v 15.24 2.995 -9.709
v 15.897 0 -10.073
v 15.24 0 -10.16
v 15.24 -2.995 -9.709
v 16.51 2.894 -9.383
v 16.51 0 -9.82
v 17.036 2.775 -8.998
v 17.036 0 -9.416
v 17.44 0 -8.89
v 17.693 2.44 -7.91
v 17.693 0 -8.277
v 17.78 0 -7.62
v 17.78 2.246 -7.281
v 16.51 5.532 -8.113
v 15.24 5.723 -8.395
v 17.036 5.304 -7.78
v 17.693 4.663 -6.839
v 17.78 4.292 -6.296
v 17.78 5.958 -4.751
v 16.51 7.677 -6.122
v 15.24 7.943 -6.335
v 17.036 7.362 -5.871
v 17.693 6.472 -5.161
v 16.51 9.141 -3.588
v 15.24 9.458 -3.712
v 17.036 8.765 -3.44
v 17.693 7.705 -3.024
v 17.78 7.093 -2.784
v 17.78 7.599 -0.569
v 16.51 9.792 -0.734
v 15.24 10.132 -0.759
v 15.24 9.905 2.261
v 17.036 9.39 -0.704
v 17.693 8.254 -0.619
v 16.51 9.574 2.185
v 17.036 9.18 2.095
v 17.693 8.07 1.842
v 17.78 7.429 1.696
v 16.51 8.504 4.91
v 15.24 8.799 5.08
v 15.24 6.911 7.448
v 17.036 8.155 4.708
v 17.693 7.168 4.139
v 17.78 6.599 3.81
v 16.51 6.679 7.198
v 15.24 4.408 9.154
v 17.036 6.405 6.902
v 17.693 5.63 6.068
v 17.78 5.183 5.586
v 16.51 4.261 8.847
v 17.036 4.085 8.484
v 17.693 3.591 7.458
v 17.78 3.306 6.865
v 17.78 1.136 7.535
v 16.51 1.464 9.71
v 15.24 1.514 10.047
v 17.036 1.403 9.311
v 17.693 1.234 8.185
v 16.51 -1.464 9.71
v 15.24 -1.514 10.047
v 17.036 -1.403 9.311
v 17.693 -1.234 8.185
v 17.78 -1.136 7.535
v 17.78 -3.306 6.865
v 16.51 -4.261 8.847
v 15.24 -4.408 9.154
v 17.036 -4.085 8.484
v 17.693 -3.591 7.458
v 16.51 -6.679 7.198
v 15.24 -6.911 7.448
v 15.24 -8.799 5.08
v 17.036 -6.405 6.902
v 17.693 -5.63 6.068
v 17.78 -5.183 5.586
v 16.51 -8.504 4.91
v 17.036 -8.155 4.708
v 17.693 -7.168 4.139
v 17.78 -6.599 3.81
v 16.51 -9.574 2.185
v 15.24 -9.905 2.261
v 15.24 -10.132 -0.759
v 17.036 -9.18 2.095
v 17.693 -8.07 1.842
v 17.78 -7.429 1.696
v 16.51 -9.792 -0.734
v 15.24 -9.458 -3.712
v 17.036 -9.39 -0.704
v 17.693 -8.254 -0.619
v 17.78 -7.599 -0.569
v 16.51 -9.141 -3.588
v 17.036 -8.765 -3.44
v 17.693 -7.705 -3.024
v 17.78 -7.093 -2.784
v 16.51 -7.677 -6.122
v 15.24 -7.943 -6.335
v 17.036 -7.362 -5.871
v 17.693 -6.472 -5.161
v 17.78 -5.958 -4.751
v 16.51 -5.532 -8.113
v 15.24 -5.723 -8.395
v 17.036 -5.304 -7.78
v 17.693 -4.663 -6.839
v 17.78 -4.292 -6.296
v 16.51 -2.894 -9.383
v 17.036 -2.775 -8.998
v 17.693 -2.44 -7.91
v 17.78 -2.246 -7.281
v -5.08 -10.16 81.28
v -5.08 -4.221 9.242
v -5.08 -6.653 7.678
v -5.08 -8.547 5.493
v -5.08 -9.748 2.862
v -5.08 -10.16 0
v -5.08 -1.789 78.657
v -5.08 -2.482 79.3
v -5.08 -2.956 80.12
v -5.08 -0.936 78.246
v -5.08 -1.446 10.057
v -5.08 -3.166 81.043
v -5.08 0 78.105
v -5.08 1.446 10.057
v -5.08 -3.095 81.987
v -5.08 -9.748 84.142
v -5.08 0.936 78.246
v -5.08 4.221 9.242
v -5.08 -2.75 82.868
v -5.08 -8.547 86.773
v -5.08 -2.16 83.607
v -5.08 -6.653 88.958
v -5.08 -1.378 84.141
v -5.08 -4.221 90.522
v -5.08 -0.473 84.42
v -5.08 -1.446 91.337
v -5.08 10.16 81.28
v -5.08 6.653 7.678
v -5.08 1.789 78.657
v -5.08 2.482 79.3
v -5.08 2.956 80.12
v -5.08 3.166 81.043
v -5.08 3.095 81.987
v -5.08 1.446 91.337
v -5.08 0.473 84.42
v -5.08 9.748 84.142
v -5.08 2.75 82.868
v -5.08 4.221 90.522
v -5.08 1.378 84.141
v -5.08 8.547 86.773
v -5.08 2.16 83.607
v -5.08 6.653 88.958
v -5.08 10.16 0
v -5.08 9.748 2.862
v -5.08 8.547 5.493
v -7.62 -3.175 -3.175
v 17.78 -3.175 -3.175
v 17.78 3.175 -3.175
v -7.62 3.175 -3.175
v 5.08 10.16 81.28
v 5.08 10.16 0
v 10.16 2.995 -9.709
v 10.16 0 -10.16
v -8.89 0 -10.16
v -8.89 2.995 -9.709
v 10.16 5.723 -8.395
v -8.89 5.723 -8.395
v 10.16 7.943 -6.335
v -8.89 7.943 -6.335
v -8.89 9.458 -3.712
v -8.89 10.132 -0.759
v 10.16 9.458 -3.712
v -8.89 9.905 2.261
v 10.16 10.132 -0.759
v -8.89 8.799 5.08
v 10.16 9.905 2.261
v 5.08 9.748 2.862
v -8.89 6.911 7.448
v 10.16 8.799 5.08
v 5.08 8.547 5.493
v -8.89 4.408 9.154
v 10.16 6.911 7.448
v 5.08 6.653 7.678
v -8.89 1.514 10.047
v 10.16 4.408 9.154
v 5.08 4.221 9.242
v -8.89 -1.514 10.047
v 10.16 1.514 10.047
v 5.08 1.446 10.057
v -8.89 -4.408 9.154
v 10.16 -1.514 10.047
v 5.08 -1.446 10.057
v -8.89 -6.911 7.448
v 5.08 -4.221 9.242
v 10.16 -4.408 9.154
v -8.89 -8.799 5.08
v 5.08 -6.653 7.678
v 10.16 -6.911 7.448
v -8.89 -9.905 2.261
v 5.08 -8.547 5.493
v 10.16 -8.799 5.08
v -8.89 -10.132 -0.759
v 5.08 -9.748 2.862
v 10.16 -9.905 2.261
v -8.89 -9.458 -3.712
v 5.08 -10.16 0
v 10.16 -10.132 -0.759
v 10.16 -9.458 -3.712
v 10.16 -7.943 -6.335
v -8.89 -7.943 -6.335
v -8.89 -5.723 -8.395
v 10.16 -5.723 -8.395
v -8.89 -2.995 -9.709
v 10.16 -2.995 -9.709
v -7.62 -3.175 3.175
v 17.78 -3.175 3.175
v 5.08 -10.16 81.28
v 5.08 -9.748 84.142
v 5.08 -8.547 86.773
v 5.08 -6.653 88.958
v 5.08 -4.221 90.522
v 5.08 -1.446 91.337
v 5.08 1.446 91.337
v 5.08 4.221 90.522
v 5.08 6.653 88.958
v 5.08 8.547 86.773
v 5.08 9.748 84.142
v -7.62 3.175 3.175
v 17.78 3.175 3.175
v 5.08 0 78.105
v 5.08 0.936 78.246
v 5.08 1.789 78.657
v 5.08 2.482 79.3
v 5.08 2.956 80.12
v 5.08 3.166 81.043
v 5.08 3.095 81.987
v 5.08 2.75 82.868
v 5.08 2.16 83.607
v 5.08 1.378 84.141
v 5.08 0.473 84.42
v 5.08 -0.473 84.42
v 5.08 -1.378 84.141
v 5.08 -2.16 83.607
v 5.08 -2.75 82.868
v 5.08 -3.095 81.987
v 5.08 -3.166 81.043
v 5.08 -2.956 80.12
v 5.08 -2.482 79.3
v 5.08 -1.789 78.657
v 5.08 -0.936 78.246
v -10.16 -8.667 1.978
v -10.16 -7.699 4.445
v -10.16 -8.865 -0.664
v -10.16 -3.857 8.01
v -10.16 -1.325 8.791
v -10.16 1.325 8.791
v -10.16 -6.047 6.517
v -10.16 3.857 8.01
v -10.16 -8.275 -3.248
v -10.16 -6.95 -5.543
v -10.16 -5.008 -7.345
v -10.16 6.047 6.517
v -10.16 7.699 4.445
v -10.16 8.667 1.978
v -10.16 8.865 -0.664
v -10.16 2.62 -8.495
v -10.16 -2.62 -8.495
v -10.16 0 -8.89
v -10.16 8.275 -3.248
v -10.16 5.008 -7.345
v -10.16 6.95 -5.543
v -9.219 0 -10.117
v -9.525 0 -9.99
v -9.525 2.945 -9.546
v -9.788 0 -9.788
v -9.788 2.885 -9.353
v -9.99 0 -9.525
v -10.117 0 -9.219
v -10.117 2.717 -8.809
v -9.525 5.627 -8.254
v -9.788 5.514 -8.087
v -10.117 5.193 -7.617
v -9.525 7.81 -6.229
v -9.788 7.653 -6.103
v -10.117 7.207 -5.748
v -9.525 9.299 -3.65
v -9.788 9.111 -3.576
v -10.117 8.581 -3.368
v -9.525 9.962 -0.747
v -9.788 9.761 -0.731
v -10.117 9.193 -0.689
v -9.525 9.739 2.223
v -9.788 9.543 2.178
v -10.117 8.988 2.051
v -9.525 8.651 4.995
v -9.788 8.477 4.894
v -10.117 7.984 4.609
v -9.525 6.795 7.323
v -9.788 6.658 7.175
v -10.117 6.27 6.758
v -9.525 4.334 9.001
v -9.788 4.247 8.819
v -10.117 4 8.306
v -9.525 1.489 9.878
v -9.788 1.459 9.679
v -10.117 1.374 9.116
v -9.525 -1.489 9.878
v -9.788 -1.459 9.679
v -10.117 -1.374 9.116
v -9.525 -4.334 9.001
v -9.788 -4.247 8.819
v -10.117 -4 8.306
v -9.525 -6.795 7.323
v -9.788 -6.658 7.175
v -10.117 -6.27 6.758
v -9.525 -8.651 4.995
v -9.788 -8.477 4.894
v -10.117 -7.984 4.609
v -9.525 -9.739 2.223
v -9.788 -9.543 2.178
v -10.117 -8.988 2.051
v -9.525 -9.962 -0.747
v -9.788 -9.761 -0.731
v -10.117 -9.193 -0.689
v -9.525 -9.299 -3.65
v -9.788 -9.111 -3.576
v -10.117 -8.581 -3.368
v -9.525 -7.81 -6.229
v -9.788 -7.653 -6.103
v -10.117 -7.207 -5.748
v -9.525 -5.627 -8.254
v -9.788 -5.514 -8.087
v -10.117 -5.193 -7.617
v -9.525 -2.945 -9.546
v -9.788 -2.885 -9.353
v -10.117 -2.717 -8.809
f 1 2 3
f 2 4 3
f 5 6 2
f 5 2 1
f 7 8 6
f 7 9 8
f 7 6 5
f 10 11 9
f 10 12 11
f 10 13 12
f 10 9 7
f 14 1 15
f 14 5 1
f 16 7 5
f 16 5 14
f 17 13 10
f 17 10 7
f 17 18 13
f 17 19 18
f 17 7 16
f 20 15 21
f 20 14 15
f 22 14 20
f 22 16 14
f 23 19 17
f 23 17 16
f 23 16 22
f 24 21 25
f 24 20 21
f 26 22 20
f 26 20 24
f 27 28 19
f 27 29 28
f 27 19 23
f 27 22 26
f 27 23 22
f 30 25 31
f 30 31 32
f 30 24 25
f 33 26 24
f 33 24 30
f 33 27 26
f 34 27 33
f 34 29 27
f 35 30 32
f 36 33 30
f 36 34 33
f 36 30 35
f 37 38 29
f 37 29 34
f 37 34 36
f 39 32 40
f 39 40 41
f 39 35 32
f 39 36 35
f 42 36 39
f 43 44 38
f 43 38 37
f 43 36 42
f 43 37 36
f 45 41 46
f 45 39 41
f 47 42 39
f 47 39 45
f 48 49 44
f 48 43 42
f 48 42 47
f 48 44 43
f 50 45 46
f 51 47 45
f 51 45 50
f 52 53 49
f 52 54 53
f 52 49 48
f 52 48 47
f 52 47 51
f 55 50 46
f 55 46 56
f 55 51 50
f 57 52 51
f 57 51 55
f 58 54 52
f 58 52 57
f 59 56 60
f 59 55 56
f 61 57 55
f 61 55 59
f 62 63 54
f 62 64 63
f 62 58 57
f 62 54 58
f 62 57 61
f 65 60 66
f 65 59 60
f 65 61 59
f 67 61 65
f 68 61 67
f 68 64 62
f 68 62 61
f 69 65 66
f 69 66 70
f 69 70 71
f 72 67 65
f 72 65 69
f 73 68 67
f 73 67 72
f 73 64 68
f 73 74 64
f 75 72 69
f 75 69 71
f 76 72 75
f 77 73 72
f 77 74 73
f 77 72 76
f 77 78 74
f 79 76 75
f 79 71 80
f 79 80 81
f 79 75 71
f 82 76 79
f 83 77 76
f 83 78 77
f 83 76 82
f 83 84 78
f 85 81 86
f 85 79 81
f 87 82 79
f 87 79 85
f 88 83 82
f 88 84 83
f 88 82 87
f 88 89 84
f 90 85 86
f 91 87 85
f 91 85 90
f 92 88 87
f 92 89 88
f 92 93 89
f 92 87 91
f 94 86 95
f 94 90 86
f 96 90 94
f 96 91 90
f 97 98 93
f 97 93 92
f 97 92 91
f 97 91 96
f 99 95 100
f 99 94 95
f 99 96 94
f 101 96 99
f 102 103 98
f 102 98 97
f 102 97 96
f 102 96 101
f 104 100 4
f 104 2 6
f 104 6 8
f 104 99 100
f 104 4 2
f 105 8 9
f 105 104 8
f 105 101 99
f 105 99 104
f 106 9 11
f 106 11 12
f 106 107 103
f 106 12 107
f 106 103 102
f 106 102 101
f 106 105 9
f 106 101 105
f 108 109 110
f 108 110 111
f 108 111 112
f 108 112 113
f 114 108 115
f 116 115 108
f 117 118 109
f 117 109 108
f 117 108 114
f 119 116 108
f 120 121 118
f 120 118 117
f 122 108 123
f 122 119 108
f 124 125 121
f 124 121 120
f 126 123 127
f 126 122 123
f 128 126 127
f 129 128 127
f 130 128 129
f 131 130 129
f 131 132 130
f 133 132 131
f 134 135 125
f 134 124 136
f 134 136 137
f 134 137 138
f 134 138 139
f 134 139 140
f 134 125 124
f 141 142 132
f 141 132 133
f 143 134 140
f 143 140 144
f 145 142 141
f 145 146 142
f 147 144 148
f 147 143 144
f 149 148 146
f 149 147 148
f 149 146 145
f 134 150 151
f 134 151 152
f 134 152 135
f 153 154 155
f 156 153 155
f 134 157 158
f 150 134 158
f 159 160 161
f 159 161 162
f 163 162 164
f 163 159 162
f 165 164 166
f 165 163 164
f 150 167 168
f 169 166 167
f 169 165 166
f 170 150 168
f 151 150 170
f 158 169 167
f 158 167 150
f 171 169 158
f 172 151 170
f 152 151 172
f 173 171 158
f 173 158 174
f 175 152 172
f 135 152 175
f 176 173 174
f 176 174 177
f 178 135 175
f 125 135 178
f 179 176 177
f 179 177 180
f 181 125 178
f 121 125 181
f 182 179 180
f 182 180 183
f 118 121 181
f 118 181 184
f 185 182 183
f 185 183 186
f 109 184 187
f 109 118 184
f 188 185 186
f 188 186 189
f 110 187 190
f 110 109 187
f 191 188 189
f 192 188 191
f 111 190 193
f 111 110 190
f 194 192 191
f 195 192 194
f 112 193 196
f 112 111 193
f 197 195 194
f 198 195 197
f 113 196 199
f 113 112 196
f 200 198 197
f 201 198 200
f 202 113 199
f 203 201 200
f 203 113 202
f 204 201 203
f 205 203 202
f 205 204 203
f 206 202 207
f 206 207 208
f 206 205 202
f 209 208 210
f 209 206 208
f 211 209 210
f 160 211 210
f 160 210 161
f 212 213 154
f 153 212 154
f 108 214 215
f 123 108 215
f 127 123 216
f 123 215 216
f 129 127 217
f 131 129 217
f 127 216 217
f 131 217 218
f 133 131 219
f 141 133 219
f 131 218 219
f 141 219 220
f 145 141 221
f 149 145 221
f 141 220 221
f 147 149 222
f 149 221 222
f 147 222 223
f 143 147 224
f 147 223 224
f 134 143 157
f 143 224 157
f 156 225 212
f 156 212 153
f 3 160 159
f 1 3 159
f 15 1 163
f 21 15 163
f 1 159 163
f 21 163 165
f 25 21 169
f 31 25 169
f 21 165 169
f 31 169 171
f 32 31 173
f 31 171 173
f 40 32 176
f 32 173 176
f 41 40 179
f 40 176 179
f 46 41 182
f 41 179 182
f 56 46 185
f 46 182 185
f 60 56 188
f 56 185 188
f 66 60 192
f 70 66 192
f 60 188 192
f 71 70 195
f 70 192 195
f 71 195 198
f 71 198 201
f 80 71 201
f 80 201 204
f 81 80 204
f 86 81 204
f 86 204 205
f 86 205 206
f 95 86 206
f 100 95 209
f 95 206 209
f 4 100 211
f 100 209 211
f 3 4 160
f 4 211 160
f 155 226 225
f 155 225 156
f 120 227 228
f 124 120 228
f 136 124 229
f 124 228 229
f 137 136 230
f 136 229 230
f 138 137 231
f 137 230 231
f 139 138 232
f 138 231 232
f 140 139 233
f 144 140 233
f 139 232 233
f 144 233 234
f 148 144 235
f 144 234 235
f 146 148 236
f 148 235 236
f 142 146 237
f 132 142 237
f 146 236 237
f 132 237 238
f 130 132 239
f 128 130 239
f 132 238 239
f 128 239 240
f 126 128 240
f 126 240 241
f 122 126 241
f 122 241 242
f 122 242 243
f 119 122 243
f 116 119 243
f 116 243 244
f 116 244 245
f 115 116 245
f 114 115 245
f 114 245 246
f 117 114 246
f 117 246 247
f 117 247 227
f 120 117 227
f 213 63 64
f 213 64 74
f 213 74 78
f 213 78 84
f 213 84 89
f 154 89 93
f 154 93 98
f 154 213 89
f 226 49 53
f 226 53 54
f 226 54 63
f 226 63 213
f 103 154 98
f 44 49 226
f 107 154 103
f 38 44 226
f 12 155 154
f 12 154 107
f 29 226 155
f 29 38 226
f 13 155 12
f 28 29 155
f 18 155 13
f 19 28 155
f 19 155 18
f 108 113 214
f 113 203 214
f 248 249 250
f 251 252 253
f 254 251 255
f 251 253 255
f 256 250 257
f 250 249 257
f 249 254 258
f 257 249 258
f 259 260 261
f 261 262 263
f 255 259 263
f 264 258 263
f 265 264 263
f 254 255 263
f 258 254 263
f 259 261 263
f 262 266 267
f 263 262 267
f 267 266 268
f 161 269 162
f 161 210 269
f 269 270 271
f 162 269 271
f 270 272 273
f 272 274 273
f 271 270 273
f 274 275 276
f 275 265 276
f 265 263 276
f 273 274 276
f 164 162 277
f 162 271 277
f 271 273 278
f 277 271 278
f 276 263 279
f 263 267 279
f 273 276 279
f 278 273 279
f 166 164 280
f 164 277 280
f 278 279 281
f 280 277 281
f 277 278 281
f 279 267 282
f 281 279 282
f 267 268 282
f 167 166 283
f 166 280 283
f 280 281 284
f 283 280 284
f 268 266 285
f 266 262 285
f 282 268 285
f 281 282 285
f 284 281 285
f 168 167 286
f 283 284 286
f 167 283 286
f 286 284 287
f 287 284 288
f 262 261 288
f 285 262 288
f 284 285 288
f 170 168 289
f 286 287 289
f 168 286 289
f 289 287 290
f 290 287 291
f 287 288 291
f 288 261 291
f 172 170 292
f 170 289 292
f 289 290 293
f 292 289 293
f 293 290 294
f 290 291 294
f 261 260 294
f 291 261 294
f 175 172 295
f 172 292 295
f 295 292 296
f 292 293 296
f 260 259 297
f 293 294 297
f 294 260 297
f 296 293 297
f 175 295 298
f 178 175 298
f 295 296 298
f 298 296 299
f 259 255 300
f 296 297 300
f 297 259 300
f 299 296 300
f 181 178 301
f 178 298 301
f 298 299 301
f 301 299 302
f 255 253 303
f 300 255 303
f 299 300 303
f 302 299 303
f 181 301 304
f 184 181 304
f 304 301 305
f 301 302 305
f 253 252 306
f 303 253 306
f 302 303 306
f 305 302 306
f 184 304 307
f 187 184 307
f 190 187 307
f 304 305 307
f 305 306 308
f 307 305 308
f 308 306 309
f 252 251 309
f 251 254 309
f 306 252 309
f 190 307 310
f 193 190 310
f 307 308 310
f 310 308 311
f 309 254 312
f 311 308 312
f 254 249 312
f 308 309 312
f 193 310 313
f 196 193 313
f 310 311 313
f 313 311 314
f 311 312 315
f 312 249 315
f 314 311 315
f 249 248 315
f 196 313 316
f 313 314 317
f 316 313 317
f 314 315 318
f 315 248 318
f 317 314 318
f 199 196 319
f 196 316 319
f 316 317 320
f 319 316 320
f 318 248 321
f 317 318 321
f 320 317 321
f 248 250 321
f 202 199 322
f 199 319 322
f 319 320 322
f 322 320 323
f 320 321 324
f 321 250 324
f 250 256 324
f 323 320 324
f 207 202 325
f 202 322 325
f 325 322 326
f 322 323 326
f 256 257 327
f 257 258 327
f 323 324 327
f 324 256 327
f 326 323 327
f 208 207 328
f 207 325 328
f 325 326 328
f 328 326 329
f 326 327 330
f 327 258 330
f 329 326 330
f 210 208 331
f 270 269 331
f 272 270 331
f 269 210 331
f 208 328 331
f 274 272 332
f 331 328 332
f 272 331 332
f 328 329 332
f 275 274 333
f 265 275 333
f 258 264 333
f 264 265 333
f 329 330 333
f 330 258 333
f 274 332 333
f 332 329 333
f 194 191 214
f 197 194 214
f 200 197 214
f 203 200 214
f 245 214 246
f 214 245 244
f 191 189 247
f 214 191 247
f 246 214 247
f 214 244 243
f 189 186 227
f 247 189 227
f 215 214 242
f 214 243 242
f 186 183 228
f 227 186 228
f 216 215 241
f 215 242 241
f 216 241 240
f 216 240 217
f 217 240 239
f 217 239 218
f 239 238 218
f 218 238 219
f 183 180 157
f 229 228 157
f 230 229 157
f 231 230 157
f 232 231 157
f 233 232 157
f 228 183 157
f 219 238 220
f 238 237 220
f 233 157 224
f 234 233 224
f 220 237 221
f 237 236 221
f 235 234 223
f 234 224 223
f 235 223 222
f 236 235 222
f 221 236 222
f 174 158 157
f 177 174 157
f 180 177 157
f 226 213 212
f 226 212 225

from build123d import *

# Parameters (mm, degrees)
SKETCH1_R           = 10.16
BOSS_EXTRUDE1_DEPTH = 10.16
FILLET1_R           = 1.27
BOSS_EXTRUDE2_DEPTH = 5.08
SKETCH3_R           = 10.16
BOSS_EXTRUDE3_DEPTH = 7.62
FILLET2_R           = 2.54
SKETCH4_W           = 6.35
SKETCH4_H           = 6.35
CUT_EXTRUDE1_DEPTH  = 25.4
SKETCH5_R           = 3.175
CUT_EXTRUDE2_DEPTH  = 16.24


with BuildPart() as part:
    # Sketch1 → Boss-Extrude1 (new body, symmetric)
    with BuildSketch(Plane(origin=(0, 0, 0), x_dir=(0, 0, -1), z_dir=(1, 0, 0))):
        Circle(SKETCH1_R)
    extrude(amount=BOSS_EXTRUDE1_DEPTH, both=True)

    # Fillet1
    fillet1_edges = [part.edges().sort_by_distance(p)[0] for p in [
        (-10.16, 0, 10.16),
    ]]
    fillet(fillet1_edges, radius=FILLET1_R)

    # Sketch2 → Boss-Extrude2 (add, symmetric)
    with BuildSketch(Plane(origin=(0, 0, 0), x_dir=(0, 0, -1), z_dir=(1, 0, 0))):
        with BuildLine():
            Line((-81.28, 10.16), (0, 10.16))
            ThreePointArc((0, 10.16), (10.16, 0), (0, -10.16))
            Line((0, -10.16), (-81.28, -10.16))
            ThreePointArc((-81.28, -10.16), (-91.44, 0), (-81.28, 10.16))
        make_face()
    extrude(amount=BOSS_EXTRUDE2_DEPTH, both=True)

    # Sketch3 → Boss-Extrude3 (add)
    with BuildSketch(Plane(origin=(10.16, 0, 0), x_dir=(0, 0, -1), z_dir=(1, 0, 0))):
        Circle(SKETCH3_R)
    extrude(amount=BOSS_EXTRUDE3_DEPTH)

    # Fillet2
    fillet2_edges = [part.edges().sort_by_distance(p)[0] for p in [
        (17.78, 0, 10.16),
    ]]
    fillet(fillet2_edges, radius=FILLET2_R)

    # Sketch4 → Cut-Extrude1 (cut)
    with BuildSketch(Plane(origin=(17.78, 0, 0), x_dir=(0, 0, -1), z_dir=(1, 0, 0))):
        Rectangle(SKETCH4_W, SKETCH4_H)
    extrude(amount=-CUT_EXTRUDE1_DEPTH, mode=Mode.SUBTRACT)

    # Sketch5 → Cut-Extrude2 (cut, through all)
    with BuildSketch(Plane(origin=(5.08, 0, 0), x_dir=(0, 0, -1), z_dir=(1, 0, 0))):
        with Locations((-81.28, 0)):
            Circle(SKETCH5_R)
    extrude(amount=-CUT_EXTRUDE2_DEPTH, mode=Mode.SUBTRACT)


solid = part.part
